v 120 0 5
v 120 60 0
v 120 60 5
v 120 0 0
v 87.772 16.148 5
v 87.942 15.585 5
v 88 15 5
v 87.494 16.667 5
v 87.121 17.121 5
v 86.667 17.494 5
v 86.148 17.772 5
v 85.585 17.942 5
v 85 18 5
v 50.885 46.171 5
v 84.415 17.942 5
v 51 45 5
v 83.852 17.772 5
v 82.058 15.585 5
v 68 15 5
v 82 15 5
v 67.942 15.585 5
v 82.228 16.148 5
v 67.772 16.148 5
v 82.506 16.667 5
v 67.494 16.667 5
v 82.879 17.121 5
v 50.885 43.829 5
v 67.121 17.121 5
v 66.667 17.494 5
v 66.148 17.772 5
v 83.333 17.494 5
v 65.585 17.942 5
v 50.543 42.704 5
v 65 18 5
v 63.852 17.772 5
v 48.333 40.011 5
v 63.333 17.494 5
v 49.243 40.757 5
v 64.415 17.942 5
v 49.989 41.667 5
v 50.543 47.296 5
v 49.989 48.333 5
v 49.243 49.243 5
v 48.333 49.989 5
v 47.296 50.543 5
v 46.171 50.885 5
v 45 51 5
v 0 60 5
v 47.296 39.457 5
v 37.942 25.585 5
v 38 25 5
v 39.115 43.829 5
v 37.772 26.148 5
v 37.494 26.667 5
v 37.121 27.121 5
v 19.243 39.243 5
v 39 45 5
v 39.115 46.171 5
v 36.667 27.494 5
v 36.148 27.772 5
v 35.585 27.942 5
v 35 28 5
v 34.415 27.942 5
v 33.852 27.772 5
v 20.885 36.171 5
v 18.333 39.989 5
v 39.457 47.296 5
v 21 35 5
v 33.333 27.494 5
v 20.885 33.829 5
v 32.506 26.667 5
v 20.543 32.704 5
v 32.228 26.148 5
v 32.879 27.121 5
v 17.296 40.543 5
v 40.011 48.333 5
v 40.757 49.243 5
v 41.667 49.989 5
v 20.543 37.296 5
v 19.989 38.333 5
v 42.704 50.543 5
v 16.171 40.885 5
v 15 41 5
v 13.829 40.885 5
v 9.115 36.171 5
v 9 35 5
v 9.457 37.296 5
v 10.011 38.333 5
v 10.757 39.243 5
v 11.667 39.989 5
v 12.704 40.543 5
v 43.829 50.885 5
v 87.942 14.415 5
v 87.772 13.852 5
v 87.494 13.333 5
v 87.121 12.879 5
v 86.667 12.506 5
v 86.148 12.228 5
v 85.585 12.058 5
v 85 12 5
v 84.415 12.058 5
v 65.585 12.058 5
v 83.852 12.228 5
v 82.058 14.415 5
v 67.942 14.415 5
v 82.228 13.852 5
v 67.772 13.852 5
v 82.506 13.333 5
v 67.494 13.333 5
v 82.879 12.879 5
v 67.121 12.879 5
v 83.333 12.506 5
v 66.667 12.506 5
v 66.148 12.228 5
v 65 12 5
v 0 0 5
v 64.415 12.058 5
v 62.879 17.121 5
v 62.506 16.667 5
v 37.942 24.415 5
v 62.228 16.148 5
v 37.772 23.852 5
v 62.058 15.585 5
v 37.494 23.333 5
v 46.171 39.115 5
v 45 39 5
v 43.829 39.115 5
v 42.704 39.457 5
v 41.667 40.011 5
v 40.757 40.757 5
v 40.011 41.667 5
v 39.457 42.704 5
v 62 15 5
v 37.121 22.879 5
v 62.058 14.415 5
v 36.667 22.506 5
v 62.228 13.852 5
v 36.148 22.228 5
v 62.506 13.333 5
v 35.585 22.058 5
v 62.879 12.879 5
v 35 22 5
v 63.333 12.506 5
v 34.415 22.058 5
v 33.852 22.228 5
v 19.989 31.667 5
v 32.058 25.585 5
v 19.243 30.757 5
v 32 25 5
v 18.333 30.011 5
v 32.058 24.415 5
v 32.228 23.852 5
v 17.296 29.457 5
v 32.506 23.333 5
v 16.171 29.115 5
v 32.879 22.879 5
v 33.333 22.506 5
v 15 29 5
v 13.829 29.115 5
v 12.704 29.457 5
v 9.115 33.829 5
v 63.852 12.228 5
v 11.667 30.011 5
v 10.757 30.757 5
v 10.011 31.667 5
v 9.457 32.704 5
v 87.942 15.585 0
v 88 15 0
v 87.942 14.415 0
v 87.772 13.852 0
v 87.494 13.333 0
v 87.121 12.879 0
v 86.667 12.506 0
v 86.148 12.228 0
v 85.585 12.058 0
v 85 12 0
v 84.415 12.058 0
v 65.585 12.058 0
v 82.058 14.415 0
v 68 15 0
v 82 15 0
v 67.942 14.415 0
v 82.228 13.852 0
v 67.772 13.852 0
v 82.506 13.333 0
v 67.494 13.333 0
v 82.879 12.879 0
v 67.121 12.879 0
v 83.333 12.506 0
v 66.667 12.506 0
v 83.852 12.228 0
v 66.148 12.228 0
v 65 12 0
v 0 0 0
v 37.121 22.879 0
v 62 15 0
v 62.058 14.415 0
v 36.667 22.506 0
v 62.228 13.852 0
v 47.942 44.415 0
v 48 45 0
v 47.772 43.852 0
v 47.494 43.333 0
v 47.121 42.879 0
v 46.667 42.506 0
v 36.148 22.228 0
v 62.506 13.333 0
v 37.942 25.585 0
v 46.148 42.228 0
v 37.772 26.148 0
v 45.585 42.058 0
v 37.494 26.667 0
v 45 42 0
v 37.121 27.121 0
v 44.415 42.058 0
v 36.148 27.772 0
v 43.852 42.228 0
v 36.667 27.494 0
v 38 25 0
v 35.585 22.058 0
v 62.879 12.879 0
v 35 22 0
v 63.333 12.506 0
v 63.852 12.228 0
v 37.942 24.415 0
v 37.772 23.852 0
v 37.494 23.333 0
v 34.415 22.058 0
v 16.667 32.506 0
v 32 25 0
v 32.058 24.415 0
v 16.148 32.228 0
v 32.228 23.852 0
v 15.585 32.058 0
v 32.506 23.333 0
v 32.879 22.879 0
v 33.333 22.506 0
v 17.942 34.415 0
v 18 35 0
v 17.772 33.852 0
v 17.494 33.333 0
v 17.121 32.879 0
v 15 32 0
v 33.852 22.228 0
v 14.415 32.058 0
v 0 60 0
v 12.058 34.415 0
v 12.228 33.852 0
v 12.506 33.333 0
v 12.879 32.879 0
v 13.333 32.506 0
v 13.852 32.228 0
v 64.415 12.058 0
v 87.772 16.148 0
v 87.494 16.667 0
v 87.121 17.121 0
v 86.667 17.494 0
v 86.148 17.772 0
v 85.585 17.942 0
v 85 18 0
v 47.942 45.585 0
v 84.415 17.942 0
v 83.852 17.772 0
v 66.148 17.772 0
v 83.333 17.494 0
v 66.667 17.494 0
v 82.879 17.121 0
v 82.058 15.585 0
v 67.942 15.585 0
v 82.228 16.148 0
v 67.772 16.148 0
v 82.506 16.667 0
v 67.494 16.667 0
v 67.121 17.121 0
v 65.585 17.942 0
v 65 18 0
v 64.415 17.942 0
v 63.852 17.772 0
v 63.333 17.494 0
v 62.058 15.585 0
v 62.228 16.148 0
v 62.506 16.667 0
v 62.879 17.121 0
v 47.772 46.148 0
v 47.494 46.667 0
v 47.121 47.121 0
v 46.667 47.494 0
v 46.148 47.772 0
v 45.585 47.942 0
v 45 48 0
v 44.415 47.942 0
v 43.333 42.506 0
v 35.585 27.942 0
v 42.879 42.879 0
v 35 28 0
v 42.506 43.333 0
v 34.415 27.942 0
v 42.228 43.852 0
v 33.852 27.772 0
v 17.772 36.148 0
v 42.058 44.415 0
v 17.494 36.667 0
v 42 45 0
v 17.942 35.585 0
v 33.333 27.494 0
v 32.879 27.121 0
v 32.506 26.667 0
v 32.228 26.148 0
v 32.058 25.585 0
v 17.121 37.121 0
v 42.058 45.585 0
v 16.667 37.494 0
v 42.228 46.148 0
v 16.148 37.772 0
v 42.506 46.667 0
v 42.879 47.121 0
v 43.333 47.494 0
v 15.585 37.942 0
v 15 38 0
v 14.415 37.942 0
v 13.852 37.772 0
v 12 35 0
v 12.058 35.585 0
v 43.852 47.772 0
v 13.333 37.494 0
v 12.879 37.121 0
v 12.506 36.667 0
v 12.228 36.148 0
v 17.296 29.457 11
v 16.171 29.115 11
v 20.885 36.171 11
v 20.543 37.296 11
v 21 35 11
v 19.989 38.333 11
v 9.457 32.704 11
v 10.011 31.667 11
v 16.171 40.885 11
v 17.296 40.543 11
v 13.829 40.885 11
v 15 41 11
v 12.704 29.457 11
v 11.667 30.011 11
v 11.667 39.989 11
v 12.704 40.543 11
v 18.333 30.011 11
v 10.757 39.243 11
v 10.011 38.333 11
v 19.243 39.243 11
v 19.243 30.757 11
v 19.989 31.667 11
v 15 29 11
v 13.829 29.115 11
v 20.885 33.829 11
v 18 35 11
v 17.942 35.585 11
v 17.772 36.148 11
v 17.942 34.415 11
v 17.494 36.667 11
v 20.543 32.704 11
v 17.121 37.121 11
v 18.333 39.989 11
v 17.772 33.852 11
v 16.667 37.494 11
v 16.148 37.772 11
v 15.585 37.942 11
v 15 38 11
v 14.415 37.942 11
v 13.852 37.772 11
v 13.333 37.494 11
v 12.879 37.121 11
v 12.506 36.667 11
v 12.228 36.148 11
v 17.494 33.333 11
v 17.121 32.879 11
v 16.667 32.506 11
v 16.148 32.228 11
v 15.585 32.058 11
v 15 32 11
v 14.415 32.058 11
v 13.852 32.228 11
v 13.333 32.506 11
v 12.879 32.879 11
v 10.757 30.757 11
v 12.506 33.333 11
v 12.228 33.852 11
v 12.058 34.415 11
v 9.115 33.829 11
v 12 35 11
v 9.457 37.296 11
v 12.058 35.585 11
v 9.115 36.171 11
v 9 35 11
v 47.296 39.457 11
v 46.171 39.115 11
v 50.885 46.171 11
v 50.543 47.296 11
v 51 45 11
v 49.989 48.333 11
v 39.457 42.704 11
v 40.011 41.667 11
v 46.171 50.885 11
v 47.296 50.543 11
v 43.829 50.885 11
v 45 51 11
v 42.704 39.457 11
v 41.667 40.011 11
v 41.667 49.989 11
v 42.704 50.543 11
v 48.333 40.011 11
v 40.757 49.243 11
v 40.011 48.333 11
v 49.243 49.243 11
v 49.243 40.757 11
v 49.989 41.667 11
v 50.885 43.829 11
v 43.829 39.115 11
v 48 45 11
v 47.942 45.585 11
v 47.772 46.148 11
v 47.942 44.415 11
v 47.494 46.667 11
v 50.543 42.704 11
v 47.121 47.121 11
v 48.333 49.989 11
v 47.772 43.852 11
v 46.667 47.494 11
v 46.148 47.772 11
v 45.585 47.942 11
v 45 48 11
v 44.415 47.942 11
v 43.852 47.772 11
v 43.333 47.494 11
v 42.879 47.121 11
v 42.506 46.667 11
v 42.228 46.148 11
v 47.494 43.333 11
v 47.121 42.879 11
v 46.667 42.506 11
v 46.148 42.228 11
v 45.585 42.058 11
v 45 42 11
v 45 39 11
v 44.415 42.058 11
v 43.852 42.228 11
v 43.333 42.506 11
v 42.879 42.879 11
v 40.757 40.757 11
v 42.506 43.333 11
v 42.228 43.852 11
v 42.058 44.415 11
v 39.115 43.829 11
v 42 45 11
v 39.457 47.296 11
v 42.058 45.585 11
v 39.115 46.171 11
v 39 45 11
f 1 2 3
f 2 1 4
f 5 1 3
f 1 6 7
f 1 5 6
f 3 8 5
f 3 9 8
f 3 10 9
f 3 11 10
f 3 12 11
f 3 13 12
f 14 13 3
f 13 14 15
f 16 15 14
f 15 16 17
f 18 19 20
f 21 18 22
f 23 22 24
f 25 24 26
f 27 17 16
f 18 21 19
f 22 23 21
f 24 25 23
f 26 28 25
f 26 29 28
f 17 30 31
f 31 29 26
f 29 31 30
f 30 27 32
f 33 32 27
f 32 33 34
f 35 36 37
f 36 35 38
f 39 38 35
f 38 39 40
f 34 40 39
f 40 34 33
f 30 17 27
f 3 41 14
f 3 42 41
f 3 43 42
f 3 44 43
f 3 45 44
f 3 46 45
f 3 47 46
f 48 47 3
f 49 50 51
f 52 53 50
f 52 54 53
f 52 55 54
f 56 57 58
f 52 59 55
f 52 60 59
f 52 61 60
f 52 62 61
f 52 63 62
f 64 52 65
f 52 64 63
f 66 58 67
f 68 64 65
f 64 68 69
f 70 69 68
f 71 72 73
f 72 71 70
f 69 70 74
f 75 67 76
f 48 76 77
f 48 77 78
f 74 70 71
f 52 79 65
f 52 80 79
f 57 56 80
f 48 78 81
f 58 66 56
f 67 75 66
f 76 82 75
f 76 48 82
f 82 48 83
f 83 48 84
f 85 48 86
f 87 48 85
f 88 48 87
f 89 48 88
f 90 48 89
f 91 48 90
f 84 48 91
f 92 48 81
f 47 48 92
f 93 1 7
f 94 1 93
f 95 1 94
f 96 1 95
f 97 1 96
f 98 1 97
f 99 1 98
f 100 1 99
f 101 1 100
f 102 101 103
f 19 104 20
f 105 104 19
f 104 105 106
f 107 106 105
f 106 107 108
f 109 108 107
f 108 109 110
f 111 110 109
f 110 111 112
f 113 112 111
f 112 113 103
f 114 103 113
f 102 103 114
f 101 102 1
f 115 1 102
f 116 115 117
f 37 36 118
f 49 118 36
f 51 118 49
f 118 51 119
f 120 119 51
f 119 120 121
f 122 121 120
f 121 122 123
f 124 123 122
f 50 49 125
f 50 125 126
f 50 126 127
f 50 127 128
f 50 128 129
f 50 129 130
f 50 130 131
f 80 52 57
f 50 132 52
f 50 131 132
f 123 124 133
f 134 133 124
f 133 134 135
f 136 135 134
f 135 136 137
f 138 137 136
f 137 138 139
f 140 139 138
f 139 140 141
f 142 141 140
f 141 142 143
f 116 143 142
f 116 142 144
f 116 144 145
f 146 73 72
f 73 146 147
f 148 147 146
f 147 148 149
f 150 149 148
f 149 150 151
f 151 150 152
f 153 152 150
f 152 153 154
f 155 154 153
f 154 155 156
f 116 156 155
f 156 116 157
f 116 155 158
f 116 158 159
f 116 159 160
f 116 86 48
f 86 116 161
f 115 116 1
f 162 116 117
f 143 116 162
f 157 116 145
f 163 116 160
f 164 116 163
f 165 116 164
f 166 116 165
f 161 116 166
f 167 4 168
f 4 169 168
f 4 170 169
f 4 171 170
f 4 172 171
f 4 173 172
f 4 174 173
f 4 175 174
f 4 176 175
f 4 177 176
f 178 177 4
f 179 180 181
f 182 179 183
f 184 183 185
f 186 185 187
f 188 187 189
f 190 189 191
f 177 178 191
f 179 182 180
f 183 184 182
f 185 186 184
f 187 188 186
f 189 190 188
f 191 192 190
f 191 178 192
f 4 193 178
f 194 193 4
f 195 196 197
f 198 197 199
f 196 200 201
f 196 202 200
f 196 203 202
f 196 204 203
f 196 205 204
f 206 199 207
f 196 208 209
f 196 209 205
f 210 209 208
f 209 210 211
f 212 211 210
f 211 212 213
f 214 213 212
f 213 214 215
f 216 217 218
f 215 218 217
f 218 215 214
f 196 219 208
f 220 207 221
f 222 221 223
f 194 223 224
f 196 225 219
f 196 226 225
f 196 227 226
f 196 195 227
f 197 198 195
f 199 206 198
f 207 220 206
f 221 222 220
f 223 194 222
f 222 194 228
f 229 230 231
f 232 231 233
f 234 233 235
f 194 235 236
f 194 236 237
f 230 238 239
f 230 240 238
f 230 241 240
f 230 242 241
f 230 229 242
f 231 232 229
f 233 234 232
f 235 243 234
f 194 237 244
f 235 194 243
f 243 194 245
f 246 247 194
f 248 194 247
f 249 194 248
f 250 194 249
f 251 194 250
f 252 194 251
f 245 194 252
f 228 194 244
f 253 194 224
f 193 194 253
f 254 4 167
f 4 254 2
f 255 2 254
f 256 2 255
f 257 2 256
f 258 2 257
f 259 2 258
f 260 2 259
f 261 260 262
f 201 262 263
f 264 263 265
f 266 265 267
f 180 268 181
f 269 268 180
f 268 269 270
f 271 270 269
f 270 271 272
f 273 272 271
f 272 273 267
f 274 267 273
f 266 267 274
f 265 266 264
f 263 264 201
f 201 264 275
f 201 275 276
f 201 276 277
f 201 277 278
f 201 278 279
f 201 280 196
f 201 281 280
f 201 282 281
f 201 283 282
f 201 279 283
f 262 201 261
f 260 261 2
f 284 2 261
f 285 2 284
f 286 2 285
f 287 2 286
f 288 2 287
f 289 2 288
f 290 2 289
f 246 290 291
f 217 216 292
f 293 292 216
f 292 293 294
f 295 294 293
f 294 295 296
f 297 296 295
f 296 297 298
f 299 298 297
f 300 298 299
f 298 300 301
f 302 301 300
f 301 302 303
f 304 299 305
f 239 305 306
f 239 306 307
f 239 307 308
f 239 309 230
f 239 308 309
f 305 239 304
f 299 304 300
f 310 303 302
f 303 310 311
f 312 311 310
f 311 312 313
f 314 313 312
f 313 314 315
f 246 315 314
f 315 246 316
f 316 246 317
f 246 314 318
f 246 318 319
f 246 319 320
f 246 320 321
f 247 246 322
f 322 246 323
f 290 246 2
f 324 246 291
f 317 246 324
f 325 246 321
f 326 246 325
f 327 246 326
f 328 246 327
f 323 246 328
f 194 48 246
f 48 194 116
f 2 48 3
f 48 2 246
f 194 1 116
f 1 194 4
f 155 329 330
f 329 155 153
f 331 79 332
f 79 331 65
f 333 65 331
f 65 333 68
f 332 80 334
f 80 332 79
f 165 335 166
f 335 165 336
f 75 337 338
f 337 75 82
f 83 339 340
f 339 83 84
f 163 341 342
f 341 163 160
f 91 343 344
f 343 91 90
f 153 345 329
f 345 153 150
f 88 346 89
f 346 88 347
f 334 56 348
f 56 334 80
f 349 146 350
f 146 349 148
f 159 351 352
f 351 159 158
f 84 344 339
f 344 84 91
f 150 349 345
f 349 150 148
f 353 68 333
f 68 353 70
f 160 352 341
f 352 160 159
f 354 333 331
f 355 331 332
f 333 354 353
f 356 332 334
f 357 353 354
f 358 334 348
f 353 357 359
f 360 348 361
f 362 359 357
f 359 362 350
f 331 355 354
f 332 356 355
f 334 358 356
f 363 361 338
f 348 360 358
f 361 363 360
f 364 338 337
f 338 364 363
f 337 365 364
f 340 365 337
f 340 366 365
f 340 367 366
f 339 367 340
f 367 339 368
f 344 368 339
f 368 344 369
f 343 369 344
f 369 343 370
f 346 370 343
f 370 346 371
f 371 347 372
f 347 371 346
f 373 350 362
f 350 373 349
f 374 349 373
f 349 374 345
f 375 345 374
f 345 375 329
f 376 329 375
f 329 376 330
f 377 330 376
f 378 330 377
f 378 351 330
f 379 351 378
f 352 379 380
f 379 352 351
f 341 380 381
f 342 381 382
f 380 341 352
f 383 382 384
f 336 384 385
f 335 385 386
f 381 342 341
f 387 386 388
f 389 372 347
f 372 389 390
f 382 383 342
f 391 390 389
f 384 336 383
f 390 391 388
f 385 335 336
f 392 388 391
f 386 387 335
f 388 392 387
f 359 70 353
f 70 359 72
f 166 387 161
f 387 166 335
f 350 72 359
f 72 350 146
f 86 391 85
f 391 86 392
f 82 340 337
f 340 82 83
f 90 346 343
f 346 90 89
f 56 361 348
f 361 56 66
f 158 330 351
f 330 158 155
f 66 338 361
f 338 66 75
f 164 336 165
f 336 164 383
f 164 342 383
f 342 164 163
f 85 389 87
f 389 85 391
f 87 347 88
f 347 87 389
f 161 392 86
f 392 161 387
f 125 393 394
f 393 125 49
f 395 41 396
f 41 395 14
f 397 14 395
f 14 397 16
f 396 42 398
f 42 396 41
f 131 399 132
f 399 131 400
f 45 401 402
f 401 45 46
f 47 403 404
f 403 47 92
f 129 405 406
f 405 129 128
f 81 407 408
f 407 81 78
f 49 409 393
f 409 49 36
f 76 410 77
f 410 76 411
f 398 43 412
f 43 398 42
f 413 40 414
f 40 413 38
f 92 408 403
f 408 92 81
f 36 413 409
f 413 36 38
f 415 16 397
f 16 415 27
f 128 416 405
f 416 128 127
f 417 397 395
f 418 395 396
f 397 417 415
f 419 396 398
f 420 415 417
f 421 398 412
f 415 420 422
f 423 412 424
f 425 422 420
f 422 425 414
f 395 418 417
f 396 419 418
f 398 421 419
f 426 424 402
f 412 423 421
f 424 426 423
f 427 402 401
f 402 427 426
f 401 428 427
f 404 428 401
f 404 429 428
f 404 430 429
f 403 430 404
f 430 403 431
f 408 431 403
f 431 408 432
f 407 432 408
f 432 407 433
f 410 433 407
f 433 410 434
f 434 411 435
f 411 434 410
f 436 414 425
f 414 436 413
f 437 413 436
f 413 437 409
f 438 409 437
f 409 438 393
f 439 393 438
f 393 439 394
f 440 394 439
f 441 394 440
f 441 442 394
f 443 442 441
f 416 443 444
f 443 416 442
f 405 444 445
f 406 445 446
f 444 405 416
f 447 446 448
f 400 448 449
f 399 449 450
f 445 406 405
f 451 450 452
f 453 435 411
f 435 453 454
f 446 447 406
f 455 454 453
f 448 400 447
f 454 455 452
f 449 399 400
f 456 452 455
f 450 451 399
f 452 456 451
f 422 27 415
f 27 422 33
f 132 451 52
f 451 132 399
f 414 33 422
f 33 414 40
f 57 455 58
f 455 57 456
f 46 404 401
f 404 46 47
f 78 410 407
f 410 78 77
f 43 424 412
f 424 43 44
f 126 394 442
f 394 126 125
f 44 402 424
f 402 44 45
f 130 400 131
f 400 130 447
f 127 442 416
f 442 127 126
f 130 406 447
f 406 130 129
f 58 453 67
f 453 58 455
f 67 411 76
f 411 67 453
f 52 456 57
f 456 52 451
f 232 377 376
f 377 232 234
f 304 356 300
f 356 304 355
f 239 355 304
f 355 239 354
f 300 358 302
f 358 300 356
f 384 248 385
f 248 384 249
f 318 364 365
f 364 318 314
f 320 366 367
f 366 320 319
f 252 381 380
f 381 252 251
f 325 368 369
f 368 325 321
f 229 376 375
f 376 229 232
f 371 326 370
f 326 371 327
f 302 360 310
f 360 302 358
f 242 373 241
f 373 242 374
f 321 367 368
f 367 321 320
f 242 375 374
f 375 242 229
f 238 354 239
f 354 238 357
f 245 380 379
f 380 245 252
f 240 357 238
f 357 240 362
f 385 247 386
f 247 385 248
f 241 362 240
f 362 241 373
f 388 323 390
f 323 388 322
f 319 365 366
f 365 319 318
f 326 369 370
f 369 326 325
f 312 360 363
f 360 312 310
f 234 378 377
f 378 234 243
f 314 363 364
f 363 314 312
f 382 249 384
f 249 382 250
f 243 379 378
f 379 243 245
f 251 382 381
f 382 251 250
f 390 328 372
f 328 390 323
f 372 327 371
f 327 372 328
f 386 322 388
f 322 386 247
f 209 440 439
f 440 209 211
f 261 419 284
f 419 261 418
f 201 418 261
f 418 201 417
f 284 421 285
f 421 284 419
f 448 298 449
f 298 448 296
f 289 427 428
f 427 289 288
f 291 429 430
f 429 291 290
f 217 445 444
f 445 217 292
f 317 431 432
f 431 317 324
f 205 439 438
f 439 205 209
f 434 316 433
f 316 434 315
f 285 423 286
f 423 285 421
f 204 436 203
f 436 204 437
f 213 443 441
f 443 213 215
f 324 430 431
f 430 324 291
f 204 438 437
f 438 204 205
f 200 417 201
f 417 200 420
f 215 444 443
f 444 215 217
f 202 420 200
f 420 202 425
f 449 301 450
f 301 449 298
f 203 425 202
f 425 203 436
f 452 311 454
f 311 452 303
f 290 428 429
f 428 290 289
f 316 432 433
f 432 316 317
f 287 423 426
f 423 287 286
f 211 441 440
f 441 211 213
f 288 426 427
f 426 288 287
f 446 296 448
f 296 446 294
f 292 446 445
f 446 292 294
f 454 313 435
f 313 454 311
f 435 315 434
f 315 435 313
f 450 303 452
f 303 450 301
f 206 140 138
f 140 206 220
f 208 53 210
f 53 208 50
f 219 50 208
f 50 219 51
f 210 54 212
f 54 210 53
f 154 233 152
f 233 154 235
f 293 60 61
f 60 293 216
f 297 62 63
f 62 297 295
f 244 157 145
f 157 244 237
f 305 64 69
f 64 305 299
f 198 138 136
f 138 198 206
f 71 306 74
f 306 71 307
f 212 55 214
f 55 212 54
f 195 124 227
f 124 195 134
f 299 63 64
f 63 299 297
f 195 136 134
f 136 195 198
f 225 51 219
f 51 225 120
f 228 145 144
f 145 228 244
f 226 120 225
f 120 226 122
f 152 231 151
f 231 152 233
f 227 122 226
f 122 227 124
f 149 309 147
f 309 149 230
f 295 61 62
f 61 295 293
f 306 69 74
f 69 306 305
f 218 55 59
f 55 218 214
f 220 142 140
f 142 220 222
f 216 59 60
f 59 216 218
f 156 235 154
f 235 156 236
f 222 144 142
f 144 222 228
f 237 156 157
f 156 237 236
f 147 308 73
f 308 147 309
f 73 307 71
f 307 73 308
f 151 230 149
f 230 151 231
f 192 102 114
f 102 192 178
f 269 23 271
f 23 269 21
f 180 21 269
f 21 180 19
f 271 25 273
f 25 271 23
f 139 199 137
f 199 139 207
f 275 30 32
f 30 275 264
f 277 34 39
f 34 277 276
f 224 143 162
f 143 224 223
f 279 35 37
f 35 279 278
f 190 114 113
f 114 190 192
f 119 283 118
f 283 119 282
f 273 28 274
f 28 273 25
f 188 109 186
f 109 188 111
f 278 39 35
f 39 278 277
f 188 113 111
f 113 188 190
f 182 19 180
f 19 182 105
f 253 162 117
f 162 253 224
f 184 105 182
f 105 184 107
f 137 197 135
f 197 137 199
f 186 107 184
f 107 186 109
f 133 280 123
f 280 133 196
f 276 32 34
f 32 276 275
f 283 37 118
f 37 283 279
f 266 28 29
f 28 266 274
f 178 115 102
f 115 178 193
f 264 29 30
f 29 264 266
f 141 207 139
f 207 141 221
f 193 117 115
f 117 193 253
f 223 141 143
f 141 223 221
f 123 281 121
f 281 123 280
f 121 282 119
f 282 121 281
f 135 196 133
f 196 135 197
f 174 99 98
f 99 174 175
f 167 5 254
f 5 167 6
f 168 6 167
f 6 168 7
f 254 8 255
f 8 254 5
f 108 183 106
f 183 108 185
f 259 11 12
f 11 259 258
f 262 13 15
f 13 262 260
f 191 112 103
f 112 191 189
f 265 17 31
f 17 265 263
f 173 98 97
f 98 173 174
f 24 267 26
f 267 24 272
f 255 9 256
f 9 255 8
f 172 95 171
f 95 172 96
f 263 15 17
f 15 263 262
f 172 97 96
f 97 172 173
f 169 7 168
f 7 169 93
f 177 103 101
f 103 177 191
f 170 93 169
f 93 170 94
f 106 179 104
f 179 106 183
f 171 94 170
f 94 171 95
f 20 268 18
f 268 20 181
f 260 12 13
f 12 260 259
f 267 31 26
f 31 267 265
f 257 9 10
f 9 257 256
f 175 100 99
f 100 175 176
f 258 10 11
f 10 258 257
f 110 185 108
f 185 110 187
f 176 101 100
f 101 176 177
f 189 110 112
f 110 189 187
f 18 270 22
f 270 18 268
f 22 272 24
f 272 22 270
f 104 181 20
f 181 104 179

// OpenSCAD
$fn = 32;

// ----------------------------------------------------------------------
// Mixed field: bosses and holes at given coordinates
// ----------------------------------------------------------------------

// --- parameters (mm) ---
plate_l = 120;            // plate length, X
plate_w = 60;             // plate width, Y
plate_t = 5;              // plate thickness, Z
boss_d = 12;              // boss diameter
boss_h = 6;               // boss height above the plate
hole_d = 6;               // through hole diameter

total_h = plate_t + boss_h;  // overall height

difference() {
  union() {
    cube([plate_l, plate_w, plate_t]);
    translate([15, 35, plate_t]) cylinder(h = boss_h, d = boss_d);
    translate([45, 45, plate_t]) cylinder(h = boss_h, d = boss_d);
  }
  translate([15, 35, -1]) cylinder(h = total_h + 2, d = boss_d / 2);
  translate([45, 45, -1]) cylinder(h = total_h + 2, d = boss_d / 2);
  translate([35, 25, -1]) cylinder(h = plate_t + 2, d = hole_d);
  translate([65, 15, -1]) cylinder(h = plate_t + 2, d = hole_d);
  translate([85, 15, -1]) cylinder(h = plate_t + 2, d = hole_d);
}
